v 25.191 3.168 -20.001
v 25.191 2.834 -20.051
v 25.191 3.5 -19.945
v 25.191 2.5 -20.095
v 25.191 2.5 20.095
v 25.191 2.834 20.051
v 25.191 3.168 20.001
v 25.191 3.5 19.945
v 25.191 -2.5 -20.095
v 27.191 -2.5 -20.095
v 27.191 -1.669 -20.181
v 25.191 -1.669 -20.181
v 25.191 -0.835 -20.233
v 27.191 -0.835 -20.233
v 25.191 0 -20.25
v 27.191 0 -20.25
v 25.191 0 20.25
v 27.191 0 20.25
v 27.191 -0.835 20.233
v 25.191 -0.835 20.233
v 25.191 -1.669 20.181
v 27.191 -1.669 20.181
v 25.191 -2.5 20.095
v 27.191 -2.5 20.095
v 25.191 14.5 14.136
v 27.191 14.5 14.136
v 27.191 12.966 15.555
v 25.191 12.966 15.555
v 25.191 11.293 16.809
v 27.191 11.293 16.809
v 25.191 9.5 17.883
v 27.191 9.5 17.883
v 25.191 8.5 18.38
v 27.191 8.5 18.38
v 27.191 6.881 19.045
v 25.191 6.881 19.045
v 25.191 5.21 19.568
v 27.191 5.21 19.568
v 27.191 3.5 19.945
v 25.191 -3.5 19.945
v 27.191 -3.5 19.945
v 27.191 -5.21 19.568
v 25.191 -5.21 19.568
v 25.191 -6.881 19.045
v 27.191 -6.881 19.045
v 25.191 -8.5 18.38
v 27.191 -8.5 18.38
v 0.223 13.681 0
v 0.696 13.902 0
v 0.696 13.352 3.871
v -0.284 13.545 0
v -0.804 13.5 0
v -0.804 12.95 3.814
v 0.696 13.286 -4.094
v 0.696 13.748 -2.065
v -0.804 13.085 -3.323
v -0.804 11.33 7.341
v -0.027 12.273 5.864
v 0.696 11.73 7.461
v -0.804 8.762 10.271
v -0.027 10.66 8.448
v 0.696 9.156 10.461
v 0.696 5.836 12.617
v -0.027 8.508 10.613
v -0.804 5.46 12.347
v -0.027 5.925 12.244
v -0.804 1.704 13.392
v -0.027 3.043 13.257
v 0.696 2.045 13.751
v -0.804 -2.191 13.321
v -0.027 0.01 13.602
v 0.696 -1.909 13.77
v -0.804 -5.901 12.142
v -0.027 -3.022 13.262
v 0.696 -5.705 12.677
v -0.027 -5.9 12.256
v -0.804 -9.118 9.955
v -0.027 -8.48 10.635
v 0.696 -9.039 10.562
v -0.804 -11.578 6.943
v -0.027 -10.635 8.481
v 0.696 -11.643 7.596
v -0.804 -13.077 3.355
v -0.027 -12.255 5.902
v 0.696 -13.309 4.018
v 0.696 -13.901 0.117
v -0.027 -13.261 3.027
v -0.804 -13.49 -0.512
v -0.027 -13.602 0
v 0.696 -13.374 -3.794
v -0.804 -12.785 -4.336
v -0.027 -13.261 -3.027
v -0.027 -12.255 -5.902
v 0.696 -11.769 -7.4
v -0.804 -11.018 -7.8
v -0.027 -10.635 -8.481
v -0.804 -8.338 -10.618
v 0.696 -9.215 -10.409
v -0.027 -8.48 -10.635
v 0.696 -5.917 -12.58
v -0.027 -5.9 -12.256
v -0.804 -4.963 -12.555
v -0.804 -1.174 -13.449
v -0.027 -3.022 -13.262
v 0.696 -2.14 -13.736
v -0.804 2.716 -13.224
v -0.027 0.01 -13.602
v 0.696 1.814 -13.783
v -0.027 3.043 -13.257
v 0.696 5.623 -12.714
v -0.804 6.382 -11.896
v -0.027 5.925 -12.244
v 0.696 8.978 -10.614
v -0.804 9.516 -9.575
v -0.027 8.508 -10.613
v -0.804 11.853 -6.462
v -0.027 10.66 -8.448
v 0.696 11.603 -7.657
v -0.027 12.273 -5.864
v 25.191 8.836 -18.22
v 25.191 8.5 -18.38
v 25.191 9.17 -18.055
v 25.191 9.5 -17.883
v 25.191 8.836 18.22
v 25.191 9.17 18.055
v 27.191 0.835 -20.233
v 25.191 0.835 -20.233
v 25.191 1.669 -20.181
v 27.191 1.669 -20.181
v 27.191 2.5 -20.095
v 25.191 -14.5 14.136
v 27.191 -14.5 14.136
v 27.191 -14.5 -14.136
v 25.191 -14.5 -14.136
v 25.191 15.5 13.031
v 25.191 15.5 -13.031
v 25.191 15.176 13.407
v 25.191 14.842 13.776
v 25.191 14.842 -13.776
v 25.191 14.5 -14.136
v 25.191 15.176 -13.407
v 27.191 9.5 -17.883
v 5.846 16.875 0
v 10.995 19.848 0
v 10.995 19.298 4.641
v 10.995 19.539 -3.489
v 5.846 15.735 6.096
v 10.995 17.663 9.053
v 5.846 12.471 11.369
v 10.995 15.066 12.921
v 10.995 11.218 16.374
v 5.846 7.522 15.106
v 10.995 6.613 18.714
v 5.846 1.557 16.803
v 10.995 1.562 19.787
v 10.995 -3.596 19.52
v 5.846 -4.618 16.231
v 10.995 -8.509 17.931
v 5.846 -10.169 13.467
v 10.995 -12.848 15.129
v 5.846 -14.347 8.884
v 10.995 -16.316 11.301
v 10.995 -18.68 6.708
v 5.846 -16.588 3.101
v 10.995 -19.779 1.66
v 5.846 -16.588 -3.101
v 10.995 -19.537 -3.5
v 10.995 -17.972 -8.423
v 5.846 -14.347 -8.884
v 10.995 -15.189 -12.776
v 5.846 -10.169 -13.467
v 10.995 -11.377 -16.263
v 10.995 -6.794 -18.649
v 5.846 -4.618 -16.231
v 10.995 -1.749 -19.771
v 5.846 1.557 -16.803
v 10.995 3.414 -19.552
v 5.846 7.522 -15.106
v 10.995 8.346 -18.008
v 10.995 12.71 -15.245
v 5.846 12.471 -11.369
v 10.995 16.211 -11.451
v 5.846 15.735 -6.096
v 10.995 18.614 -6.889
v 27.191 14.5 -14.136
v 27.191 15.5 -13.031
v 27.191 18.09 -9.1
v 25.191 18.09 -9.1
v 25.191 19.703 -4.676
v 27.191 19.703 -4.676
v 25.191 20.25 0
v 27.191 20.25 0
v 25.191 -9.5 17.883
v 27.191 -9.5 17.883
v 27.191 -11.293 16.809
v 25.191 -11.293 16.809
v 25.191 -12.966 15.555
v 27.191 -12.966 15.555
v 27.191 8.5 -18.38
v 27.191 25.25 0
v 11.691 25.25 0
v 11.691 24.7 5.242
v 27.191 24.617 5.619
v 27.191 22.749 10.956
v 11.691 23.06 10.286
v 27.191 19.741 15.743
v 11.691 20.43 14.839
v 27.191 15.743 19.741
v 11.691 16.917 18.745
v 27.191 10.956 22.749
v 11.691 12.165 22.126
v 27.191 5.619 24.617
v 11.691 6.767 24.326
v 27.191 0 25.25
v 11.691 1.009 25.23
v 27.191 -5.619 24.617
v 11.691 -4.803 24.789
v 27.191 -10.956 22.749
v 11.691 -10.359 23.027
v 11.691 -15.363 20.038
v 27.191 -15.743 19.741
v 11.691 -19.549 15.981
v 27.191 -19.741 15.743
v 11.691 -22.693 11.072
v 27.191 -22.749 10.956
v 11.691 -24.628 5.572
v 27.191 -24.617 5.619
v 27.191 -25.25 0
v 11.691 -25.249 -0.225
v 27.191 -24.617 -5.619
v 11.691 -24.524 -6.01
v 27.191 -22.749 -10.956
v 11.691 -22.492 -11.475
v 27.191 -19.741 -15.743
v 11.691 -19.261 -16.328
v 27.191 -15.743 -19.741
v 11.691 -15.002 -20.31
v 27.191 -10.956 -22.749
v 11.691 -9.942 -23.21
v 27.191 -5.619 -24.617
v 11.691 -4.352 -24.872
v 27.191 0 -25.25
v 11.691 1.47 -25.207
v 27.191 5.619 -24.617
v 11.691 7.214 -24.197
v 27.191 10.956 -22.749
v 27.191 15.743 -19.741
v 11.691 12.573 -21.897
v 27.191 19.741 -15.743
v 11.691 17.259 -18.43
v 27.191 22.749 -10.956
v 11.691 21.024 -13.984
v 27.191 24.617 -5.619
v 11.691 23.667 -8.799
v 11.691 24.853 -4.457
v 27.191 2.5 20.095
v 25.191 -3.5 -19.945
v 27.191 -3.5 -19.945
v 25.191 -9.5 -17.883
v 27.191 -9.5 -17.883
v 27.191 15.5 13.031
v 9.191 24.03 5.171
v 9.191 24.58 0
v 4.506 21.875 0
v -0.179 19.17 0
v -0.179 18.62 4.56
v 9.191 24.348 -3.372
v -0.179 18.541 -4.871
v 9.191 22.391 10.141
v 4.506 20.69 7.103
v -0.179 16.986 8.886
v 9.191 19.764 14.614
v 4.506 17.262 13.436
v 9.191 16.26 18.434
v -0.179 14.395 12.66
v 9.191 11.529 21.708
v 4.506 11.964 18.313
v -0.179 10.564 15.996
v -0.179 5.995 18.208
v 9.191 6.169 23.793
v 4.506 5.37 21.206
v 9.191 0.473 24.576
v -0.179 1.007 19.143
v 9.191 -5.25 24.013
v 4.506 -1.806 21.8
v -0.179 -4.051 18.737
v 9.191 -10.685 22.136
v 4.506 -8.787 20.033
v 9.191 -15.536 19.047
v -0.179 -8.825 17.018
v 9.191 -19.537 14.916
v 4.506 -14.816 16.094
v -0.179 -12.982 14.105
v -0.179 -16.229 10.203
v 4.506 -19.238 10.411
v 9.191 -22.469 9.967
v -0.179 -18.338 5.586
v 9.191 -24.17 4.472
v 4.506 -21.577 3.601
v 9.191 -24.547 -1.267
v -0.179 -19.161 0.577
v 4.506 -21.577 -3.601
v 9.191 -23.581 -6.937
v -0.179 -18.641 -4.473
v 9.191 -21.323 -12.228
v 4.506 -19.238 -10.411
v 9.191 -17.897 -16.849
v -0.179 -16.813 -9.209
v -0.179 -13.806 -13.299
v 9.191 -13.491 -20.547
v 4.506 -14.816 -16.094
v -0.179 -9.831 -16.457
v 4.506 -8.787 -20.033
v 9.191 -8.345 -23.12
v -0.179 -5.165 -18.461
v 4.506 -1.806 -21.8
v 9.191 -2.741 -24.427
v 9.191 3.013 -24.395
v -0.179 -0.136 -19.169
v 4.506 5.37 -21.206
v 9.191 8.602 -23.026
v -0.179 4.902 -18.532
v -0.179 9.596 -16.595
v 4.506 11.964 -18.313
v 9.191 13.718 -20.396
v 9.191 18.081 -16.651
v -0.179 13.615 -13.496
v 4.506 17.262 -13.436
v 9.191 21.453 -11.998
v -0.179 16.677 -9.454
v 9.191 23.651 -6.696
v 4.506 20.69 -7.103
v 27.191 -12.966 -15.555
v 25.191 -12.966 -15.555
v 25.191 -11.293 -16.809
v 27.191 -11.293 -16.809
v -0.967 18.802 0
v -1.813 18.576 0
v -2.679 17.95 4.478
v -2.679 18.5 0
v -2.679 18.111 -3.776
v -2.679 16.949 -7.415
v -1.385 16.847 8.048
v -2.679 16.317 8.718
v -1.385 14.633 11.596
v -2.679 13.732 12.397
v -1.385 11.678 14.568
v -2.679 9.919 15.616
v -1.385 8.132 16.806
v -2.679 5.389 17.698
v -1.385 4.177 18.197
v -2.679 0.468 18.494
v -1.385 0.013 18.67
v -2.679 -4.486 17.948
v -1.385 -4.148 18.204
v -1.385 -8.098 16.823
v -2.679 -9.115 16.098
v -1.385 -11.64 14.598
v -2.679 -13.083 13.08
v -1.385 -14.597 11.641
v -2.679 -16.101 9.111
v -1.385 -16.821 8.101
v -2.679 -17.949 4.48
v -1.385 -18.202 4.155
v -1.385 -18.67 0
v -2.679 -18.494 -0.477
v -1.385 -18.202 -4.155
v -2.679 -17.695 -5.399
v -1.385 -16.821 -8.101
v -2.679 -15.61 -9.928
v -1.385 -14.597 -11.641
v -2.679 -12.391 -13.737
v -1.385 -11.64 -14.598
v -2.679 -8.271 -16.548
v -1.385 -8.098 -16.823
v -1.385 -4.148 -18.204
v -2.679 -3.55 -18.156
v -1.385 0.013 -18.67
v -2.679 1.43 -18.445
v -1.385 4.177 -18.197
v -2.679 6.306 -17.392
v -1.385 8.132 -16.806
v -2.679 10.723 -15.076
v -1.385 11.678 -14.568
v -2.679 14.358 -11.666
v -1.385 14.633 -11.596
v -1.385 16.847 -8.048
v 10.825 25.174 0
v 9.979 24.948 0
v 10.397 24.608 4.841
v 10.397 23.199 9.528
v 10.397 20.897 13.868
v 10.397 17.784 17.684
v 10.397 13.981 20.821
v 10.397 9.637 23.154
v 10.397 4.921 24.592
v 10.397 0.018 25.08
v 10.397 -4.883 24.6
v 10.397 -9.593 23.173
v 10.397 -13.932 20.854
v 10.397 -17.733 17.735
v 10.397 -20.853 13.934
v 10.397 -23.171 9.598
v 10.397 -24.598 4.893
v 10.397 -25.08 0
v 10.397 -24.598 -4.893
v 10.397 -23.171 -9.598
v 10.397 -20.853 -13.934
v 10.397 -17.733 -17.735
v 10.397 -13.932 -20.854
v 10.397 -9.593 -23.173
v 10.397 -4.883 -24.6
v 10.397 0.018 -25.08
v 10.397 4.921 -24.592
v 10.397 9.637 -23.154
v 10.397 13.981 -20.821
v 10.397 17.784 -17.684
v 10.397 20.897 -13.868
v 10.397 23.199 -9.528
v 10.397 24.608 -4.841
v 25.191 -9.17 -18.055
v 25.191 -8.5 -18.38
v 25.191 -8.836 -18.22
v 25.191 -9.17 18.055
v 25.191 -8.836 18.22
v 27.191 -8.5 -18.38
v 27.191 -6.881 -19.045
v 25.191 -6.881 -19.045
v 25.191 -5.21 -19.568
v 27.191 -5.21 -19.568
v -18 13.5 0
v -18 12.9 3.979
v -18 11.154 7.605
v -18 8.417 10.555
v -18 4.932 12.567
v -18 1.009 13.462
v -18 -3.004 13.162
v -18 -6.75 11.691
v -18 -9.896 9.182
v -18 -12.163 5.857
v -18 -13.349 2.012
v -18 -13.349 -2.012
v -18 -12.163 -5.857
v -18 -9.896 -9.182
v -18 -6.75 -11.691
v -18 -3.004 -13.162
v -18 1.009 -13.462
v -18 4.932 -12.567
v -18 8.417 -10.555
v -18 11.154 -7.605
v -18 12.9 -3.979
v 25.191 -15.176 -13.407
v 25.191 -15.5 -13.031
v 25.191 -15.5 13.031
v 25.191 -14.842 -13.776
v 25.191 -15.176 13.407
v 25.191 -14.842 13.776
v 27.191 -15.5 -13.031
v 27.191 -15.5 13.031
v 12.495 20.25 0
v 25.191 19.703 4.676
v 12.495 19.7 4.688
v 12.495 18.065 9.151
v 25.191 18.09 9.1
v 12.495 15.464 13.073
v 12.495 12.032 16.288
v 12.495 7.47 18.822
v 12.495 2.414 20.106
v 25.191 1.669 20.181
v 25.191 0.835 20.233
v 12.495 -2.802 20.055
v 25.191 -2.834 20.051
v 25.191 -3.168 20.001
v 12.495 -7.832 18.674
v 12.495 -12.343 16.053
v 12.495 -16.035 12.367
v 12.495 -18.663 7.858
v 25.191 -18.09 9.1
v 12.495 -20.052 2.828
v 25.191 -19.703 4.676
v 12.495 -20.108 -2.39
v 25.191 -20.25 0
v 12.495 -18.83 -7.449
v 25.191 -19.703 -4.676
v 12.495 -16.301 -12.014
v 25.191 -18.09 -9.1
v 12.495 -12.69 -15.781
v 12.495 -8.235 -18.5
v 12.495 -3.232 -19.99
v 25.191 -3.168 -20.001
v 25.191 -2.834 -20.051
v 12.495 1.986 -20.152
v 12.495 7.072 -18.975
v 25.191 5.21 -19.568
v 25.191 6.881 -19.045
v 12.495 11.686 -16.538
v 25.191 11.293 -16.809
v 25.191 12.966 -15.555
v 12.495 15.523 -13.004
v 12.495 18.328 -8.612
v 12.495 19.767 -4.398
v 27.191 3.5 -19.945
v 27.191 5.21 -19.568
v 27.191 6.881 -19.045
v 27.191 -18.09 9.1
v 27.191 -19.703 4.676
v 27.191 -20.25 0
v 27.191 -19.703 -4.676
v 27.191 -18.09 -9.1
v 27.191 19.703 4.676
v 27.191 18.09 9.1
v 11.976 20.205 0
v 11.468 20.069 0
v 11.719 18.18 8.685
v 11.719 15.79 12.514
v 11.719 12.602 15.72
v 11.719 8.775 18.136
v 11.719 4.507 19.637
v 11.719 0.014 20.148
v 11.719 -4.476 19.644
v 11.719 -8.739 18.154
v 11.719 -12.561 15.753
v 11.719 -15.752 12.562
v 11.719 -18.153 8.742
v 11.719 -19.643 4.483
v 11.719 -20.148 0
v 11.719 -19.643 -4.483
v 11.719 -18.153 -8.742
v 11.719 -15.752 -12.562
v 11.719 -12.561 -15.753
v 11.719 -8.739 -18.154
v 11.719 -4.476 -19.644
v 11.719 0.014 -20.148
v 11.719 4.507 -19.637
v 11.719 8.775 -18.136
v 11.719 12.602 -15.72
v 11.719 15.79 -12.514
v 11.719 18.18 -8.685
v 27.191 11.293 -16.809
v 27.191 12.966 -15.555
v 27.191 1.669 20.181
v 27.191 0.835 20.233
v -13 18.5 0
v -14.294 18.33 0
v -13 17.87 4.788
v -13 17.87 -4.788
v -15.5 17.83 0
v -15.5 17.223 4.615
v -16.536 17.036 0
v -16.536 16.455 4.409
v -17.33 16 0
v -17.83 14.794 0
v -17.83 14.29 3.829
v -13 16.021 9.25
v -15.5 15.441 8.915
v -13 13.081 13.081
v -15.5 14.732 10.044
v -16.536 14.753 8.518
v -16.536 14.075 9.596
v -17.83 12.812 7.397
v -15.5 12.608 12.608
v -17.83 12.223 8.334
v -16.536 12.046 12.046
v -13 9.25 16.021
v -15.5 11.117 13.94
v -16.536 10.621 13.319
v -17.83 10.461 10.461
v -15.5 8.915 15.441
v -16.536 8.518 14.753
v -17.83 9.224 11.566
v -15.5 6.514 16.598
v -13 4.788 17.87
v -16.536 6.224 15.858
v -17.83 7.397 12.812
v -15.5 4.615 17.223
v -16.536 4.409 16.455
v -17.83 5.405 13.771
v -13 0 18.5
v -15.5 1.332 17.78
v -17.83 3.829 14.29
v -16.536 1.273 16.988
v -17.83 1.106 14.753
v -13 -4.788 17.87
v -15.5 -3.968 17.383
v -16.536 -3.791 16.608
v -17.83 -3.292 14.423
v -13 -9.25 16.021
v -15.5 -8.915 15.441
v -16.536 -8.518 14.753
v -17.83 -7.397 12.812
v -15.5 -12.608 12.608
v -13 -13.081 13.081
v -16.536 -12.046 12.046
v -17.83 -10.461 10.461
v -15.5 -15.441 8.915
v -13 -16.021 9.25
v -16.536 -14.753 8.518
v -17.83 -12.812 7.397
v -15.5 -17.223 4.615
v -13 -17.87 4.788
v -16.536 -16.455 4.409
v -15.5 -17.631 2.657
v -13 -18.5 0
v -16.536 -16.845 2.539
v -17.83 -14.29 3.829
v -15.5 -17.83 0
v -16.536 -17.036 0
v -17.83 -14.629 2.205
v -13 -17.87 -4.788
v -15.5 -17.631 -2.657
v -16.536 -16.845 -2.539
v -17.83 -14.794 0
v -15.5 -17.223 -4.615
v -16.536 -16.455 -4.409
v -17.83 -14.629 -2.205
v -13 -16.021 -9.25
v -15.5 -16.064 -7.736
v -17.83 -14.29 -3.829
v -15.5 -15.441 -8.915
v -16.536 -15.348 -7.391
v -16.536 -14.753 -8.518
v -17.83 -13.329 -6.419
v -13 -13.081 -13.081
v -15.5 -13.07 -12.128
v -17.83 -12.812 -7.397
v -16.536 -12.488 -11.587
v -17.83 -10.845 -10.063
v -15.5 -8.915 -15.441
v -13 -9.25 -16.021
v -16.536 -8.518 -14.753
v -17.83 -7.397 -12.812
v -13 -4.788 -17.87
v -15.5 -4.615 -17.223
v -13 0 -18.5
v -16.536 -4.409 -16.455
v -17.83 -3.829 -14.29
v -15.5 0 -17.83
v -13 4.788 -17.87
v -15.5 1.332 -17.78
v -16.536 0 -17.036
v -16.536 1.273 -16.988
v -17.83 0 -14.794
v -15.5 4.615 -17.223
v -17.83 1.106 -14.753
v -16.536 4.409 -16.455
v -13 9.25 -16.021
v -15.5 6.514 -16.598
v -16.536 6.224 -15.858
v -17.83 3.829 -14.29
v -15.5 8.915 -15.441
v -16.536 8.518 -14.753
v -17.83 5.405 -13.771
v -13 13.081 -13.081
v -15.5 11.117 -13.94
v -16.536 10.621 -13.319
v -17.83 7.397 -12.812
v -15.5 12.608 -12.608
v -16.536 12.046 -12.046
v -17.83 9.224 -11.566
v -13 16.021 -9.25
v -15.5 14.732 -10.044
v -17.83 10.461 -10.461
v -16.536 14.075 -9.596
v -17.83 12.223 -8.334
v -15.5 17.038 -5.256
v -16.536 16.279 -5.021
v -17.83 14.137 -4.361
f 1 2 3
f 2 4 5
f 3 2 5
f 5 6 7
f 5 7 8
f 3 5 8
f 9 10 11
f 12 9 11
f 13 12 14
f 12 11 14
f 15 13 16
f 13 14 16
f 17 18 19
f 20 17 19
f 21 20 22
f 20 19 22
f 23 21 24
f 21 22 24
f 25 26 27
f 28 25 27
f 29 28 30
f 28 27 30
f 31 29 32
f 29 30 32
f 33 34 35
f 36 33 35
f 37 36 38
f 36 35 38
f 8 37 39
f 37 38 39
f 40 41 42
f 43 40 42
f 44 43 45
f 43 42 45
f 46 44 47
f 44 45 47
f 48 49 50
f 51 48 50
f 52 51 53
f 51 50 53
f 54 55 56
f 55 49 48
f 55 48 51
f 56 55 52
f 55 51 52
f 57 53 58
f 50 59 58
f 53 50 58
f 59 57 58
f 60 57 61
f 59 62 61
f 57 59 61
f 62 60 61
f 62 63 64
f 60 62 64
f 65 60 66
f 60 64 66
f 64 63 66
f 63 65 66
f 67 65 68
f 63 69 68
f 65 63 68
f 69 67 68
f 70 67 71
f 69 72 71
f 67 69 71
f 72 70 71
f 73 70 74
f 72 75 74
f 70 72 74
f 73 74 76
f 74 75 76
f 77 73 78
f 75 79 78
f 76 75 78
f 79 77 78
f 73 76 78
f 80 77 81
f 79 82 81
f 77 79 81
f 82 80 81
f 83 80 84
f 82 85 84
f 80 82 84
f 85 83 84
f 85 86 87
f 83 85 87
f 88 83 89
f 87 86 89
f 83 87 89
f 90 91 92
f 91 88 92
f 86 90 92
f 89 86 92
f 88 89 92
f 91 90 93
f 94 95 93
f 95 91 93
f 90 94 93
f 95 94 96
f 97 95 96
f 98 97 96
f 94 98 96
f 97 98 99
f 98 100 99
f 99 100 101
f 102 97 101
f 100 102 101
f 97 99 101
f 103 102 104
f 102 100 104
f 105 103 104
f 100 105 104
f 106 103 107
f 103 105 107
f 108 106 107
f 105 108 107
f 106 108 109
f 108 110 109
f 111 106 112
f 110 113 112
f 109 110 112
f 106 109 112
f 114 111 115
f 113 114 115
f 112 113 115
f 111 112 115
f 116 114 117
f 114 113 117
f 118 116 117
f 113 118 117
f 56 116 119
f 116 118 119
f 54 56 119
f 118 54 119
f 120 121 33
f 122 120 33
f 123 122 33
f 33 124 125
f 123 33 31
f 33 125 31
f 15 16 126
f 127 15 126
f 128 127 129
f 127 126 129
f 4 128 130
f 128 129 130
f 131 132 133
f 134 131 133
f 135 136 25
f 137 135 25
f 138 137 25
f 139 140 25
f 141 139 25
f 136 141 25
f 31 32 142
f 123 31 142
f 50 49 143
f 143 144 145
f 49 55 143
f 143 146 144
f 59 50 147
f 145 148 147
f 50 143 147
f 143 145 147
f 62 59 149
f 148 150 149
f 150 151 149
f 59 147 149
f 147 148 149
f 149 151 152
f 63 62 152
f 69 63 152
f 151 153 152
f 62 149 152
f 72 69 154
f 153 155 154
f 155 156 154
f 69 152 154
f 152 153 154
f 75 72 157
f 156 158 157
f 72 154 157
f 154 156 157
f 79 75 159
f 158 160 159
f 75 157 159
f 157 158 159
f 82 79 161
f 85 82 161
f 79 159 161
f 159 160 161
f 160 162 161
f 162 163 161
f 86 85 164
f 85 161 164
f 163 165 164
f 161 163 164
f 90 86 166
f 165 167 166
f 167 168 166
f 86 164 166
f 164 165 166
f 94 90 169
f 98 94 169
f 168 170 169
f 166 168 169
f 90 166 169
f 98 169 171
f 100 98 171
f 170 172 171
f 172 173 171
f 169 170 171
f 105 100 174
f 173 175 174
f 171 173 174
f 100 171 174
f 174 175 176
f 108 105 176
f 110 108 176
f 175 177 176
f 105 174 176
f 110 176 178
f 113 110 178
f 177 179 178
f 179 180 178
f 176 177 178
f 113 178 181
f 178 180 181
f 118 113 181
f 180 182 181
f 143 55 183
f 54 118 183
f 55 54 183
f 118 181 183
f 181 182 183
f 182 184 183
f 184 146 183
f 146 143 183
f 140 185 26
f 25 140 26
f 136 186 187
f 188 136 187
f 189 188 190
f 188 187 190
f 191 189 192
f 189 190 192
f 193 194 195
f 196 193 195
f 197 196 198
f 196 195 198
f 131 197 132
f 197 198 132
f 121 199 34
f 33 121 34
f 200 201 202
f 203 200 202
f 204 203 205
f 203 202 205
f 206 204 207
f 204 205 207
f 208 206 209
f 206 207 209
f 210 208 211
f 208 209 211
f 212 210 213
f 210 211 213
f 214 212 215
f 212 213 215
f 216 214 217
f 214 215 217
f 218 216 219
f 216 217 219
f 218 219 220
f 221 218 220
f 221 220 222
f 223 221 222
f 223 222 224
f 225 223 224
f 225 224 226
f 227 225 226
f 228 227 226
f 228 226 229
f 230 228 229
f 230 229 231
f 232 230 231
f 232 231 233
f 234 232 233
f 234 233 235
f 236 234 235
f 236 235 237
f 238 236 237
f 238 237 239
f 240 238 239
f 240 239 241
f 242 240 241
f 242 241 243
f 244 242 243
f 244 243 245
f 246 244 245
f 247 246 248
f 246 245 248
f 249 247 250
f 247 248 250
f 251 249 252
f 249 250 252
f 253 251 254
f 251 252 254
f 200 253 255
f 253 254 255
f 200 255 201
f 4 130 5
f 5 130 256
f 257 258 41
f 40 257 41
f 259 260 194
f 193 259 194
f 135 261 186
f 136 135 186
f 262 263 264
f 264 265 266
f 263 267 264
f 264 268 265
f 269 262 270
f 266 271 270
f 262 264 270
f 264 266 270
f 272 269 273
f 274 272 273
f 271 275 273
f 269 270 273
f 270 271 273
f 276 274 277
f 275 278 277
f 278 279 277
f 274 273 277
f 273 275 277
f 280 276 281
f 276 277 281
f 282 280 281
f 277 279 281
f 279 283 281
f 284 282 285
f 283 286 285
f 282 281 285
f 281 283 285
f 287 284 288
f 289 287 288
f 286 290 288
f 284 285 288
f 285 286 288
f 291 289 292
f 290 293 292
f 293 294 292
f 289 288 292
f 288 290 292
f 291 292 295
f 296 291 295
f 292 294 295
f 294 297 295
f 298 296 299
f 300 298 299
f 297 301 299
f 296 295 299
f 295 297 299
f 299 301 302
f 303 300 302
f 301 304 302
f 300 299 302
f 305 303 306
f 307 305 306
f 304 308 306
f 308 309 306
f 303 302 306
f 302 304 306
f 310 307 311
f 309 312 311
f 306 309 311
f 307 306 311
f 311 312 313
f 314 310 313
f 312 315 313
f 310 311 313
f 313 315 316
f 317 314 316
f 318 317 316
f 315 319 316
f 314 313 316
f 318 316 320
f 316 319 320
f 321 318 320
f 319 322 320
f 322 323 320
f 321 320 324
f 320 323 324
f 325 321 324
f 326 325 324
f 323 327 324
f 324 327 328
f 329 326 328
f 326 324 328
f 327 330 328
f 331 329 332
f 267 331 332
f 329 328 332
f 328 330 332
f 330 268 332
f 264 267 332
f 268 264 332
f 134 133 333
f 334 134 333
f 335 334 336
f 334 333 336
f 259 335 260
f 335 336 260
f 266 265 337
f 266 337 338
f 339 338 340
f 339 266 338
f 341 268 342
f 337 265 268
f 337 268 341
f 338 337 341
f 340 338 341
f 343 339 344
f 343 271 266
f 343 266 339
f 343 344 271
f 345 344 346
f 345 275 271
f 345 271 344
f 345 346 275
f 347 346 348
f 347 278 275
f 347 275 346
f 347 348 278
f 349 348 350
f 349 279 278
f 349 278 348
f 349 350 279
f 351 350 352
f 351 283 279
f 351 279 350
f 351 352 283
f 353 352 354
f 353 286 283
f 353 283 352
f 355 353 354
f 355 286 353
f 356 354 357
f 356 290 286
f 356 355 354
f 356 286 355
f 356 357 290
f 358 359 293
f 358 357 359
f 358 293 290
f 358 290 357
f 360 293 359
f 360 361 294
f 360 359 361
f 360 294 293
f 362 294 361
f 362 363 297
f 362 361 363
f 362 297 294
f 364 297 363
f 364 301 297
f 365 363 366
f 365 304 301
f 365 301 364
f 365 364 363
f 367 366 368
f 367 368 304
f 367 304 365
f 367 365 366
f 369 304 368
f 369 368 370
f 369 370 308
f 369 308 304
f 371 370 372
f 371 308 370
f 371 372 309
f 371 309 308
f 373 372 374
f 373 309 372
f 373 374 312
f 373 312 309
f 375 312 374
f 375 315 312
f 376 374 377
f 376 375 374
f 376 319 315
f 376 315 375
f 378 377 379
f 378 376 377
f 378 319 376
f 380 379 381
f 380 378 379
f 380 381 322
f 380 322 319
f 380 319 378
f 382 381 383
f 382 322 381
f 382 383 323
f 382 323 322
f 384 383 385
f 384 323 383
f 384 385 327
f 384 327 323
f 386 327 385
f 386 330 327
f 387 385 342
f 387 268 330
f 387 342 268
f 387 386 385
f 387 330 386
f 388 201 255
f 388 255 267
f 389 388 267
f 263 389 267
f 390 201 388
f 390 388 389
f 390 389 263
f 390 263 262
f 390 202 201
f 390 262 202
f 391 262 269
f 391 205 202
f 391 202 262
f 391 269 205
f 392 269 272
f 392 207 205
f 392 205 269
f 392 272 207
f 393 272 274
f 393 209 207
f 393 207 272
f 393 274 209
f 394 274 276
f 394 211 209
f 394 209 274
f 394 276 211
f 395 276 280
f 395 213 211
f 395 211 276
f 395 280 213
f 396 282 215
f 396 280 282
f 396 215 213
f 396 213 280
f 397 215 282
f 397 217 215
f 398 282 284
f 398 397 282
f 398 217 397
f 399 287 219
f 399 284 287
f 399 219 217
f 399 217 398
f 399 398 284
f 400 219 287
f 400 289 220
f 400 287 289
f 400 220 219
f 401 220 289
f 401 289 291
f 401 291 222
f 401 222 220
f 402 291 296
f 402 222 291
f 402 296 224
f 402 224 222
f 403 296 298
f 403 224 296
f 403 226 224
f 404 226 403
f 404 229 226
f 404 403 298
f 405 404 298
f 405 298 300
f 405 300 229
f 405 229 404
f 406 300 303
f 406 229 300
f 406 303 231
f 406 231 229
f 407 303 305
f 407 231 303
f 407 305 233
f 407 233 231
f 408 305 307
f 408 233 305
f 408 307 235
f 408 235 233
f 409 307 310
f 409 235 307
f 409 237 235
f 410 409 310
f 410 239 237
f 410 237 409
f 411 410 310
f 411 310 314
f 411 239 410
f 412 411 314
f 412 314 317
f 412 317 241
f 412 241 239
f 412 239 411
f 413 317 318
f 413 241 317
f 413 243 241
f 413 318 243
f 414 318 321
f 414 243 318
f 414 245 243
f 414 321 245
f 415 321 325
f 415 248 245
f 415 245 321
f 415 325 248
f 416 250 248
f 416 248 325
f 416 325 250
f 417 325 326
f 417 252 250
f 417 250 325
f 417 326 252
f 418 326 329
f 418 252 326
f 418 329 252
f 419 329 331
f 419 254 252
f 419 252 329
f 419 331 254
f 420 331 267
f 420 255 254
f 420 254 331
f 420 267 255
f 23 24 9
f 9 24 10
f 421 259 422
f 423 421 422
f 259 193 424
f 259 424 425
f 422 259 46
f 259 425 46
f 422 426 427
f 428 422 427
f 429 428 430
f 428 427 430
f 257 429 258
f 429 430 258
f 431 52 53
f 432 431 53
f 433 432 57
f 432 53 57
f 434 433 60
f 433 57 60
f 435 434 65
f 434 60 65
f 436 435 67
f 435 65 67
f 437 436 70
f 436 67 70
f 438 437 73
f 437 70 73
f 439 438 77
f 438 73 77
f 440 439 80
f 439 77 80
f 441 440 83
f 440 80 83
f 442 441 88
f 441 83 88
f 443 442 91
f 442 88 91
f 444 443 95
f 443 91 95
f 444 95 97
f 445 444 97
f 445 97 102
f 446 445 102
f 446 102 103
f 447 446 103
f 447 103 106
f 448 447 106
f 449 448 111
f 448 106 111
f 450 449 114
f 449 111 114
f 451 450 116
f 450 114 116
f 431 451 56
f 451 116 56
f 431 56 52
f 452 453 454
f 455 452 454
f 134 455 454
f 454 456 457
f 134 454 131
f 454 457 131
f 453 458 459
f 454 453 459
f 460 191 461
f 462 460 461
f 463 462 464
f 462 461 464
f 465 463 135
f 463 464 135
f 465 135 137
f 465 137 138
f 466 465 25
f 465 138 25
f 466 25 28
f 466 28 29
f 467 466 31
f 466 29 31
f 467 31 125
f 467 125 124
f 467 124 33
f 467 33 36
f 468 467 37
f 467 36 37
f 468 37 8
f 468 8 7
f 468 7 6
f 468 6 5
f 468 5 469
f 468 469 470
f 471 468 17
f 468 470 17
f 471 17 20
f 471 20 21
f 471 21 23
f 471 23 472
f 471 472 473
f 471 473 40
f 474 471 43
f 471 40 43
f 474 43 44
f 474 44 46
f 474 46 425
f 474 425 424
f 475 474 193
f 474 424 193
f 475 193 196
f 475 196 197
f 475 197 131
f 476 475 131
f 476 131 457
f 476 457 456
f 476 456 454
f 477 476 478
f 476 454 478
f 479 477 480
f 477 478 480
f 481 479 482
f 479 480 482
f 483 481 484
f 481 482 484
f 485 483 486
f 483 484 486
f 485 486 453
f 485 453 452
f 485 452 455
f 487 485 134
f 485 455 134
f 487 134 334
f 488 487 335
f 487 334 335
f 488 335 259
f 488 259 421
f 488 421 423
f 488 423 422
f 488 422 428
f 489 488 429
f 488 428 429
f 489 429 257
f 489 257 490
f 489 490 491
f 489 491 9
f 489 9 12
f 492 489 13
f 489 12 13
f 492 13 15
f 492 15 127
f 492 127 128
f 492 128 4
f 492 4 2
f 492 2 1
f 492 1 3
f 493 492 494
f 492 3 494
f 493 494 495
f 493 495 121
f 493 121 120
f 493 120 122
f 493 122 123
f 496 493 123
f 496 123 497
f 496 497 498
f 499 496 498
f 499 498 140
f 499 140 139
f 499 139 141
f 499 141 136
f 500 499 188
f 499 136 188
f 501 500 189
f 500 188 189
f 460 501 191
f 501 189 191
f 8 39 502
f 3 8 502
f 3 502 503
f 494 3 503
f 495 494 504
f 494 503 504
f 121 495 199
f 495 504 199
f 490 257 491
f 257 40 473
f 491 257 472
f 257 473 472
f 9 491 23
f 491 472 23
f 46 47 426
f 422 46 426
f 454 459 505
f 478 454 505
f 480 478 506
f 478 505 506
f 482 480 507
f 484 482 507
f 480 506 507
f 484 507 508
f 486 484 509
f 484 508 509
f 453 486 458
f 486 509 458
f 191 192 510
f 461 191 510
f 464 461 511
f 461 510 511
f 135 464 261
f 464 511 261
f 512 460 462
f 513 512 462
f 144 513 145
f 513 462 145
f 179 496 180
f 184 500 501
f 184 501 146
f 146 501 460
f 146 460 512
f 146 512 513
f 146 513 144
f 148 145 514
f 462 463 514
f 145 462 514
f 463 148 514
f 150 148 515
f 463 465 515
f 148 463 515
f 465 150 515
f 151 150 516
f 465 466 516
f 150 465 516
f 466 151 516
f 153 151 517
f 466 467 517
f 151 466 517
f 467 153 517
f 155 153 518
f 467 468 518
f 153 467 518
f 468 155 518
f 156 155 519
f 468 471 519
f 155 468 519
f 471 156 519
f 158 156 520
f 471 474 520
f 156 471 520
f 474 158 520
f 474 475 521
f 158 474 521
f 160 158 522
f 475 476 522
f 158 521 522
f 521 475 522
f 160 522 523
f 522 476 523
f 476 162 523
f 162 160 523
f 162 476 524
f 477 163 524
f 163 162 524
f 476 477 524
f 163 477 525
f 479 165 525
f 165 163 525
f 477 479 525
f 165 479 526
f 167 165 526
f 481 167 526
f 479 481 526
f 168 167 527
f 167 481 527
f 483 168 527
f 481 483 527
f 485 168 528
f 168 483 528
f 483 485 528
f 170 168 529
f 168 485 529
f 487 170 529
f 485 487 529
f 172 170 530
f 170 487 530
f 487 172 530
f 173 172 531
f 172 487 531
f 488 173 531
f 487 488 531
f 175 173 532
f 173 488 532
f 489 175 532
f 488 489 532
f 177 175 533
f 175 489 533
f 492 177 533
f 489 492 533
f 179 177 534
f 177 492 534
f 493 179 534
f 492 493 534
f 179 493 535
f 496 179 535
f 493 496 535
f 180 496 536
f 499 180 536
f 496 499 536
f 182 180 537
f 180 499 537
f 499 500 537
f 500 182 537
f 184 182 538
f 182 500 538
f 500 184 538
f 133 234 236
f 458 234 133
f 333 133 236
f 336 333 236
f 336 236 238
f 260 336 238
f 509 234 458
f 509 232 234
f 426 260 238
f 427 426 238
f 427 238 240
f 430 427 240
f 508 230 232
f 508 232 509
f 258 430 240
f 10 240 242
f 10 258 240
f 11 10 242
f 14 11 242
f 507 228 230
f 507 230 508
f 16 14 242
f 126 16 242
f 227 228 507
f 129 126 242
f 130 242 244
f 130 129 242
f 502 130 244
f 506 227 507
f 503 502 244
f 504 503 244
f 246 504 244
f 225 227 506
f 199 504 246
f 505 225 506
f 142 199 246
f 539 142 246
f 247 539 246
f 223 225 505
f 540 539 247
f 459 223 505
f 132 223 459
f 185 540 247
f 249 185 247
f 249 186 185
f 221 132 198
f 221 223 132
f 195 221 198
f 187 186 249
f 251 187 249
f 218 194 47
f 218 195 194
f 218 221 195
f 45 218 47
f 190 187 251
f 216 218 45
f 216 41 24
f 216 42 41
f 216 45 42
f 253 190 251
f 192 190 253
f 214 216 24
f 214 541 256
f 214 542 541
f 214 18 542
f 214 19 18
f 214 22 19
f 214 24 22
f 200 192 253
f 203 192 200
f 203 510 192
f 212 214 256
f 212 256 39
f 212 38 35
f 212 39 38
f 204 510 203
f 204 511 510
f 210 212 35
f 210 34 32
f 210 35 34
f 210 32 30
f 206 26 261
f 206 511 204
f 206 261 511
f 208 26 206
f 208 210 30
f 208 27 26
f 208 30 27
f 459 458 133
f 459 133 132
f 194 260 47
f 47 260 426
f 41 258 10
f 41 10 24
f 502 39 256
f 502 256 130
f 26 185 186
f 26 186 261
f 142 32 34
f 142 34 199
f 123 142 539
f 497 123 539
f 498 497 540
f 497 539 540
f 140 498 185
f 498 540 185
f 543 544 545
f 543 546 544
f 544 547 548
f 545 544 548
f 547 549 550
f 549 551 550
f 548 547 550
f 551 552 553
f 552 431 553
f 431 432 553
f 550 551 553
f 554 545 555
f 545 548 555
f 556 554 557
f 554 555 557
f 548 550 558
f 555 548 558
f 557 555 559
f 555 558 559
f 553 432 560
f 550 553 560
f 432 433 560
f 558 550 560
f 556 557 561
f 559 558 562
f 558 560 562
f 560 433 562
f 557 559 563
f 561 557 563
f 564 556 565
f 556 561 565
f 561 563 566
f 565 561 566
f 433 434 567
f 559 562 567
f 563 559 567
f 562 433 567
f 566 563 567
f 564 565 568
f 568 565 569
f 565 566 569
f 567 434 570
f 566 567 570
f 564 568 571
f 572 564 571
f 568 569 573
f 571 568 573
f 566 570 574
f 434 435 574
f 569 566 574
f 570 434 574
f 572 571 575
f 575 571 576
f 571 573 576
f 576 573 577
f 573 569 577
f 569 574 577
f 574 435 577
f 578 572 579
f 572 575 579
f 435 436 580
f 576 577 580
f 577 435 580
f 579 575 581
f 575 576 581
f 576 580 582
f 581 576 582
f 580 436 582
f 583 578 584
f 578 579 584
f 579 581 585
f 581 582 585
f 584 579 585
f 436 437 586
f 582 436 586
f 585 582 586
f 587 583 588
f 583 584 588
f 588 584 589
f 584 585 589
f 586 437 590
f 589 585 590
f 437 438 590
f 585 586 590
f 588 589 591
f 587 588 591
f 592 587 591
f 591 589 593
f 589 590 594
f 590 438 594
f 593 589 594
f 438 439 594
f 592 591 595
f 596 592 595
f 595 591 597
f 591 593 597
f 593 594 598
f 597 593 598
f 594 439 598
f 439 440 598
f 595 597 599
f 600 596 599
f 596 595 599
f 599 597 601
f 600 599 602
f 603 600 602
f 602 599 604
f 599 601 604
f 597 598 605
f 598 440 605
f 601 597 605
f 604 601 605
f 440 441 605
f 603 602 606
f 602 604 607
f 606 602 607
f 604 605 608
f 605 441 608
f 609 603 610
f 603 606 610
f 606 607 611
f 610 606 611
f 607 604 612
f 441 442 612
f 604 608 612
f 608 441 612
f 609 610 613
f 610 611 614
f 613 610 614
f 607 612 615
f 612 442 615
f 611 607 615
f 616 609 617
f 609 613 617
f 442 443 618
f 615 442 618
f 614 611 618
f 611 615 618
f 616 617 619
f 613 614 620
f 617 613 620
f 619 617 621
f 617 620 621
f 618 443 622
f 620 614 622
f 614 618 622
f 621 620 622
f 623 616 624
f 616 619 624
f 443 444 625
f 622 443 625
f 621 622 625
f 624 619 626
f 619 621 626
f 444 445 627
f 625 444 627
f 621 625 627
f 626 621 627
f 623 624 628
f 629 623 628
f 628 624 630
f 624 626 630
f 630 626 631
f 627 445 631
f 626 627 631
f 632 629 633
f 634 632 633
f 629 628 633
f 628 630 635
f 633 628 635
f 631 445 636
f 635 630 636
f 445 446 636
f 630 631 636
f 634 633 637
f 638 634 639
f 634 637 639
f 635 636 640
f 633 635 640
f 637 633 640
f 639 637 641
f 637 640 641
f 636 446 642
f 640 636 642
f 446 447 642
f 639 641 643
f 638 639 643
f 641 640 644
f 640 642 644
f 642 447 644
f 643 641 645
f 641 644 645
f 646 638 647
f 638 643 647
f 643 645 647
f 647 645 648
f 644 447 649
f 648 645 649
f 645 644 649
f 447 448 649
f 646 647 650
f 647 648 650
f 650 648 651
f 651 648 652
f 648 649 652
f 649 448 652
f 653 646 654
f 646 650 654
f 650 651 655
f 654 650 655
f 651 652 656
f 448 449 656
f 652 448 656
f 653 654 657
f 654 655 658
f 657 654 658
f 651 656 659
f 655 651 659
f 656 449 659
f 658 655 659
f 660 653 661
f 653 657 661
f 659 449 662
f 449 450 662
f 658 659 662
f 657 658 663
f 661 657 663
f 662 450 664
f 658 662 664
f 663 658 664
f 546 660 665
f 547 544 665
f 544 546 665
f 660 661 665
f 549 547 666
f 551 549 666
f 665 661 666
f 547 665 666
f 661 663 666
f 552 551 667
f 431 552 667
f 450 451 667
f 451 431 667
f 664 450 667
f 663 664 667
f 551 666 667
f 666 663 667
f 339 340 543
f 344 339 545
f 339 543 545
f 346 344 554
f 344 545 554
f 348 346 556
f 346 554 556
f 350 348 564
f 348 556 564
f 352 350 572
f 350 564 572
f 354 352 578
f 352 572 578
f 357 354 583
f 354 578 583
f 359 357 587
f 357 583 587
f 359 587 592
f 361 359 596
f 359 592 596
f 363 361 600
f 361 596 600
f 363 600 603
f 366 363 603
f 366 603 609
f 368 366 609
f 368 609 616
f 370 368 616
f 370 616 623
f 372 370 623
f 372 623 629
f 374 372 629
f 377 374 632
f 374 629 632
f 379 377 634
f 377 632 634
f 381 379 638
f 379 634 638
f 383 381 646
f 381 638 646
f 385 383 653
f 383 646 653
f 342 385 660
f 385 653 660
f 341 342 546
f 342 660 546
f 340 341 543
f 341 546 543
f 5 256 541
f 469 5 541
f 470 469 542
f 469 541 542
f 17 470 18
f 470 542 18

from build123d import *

# Parameters (mm, degrees)
F2_R     = 25.25
F3_DEPTH = 2
F5_DEPTH = 2
F6_R     = 4.99999
F7_R     = 3


# Not quite as in the source:
# - a fillet or chamfer is up to 0.001 mm smaller than in the source, because OpenCascade refuses the exact size
# - a feature names something its author has since deleted; it is built from what else it names


with BuildPart() as f1:
    # F0 (on Top) → F1 (revolve)
    with BuildSketch(Plane.XY):
        Polygon((-18, 18.5), (-18, 13.5), (0, 13.5), (11.6913429511, 20.25), (25.1913429511, 20.25), (25.1913429511, 25.25), (10.3515969889, 25.25), (-1.3397459622, 18.5), align=None)
    revolve(axis=Axis((-8.7595172226, 0, 0), (1, 0, 0)))

    # F2 (on face) → F3 (join)
    with BuildSketch(Plane.YZ.offset(25.1913429511)):
        Circle(F2_R)
    extrude(amount=F3_DEPTH)

    # F4 (on face) → F5 (cut, through all)
    with BuildSketch(Plane.YZ.offset(27.1913429511)):
        with BuildLine():
            ThreePointArc((14.5, 14.1355049432), (12.1454310832, 16.2034256811), (9.5, 17.8833022678))
            Line((9.5, 17.8833022678), (9.5, -17.8833022678))
            ThreePointArc((9.5, -17.8833022678), (12.1454310832, -16.2034256811), (14.5, -14.1355049432))
            Line((14.5, -14.1355049432), (14.5, 14.1355049432))
        make_face()
        with BuildLine():
            ThreePointArc((8.5, 18.3796762757), (6.0508466769, 19.3248481105), (3.5, 19.9452375268))
            Line((3.5, 19.9452375268), (3.5, -19.9452375268))
            ThreePointArc((3.5, -19.9452375268), (6.0508466769, -19.3248481105), (8.5, -18.3796762757))
            Line((8.5, -18.3796762757), (8.5, 18.3796762757))
        make_face()
        with BuildLine():
            ThreePointArc((2.5, 20.0950864641), (1.2523975211, 20.2112345108), (0, 20.25))
            ThreePointArc((0, 20.25), (-1.2523975211, 20.2112345108), (-2.5, 20.0950864641))
            Line((-2.5, 20.0950864641), (-2.5, -20.0950864641))
            ThreePointArc((-2.5, -20.0950864641), (-1.2523975211, -20.2112345108), (0, -20.25))
            ThreePointArc((0, -20.25), (1.2523975211, -20.2112345108), (2.5, -20.0950864641))
            Line((2.5, -20.0950864641), (2.5, 20.0950864641))
        make_face()
        with BuildLine():
            Line((-3.5, -19.9452375268), (-3.5, 19.9452375268))
            ThreePointArc((-3.5, 19.9452375268), (-6.0508466769, 19.3248481105), (-8.5, 18.3796762757))
            Line((-8.5, 18.3796762757), (-8.5, -18.3796762757))
            ThreePointArc((-8.5, -18.3796762757), (-6.0508466769, -19.3248481105), (-3.5, -19.9452375268))
        make_face()
        with BuildLine():
            Line((-9.5, -17.8833022678), (-9.5, 17.8833022678))
            ThreePointArc((-9.5, 17.8833022678), (-12.1454310832, 16.2034256811), (-14.5, 14.1355049432))
            Line((-14.5, 14.1355049432), (-14.5, -14.1355049432))
            ThreePointArc((-14.5, -14.1355049432), (-12.1454310832, -16.2034256811), (-9.5, -17.8833022678))
        make_face()
        with BuildLine():
            Line((-15.5, -13.0312125299), (-15.5, 13.0312125299))
            ThreePointArc((-15.5, 13.0312125299), (-20.25, 0), (-15.5, -13.0312125299))
        make_face()
        with BuildLine():
            ThreePointArc((20.25, 0), (19.0254763409, 6.9349657533), (15.5, 13.0312125299))
            Line((15.5, 13.0312125299), (15.5, -13.0312125299))
            ThreePointArc((15.5, -13.0312125299), (19.0254763409, -6.9349657533), (20.25, 0))
        make_face()
    extrude(amount=-F5_DEPTH, mode=Mode.SUBTRACT)

    # F6 (radius 5 in the source; OpenCascade refuses exactly that, so slightly less here)
    f6_edges = [f1.edges().sort_by_distance(p)[0] for p in [
        (-18, -18.5, 0),
        (-1.339746, -18.5, 0),
        (10.351597, -25.25, 0),
    ]]
    fillet(f6_edges, radius=F6_R)

    # F7
    f7_edges = [f1.edges().sort_by_distance(p)[0] for p in [
        (11.691343, -20.25, 0),
        (0, -13.5, 0),
    ]]
    fillet(f7_edges, radius=F7_R)


solid = f1.part
